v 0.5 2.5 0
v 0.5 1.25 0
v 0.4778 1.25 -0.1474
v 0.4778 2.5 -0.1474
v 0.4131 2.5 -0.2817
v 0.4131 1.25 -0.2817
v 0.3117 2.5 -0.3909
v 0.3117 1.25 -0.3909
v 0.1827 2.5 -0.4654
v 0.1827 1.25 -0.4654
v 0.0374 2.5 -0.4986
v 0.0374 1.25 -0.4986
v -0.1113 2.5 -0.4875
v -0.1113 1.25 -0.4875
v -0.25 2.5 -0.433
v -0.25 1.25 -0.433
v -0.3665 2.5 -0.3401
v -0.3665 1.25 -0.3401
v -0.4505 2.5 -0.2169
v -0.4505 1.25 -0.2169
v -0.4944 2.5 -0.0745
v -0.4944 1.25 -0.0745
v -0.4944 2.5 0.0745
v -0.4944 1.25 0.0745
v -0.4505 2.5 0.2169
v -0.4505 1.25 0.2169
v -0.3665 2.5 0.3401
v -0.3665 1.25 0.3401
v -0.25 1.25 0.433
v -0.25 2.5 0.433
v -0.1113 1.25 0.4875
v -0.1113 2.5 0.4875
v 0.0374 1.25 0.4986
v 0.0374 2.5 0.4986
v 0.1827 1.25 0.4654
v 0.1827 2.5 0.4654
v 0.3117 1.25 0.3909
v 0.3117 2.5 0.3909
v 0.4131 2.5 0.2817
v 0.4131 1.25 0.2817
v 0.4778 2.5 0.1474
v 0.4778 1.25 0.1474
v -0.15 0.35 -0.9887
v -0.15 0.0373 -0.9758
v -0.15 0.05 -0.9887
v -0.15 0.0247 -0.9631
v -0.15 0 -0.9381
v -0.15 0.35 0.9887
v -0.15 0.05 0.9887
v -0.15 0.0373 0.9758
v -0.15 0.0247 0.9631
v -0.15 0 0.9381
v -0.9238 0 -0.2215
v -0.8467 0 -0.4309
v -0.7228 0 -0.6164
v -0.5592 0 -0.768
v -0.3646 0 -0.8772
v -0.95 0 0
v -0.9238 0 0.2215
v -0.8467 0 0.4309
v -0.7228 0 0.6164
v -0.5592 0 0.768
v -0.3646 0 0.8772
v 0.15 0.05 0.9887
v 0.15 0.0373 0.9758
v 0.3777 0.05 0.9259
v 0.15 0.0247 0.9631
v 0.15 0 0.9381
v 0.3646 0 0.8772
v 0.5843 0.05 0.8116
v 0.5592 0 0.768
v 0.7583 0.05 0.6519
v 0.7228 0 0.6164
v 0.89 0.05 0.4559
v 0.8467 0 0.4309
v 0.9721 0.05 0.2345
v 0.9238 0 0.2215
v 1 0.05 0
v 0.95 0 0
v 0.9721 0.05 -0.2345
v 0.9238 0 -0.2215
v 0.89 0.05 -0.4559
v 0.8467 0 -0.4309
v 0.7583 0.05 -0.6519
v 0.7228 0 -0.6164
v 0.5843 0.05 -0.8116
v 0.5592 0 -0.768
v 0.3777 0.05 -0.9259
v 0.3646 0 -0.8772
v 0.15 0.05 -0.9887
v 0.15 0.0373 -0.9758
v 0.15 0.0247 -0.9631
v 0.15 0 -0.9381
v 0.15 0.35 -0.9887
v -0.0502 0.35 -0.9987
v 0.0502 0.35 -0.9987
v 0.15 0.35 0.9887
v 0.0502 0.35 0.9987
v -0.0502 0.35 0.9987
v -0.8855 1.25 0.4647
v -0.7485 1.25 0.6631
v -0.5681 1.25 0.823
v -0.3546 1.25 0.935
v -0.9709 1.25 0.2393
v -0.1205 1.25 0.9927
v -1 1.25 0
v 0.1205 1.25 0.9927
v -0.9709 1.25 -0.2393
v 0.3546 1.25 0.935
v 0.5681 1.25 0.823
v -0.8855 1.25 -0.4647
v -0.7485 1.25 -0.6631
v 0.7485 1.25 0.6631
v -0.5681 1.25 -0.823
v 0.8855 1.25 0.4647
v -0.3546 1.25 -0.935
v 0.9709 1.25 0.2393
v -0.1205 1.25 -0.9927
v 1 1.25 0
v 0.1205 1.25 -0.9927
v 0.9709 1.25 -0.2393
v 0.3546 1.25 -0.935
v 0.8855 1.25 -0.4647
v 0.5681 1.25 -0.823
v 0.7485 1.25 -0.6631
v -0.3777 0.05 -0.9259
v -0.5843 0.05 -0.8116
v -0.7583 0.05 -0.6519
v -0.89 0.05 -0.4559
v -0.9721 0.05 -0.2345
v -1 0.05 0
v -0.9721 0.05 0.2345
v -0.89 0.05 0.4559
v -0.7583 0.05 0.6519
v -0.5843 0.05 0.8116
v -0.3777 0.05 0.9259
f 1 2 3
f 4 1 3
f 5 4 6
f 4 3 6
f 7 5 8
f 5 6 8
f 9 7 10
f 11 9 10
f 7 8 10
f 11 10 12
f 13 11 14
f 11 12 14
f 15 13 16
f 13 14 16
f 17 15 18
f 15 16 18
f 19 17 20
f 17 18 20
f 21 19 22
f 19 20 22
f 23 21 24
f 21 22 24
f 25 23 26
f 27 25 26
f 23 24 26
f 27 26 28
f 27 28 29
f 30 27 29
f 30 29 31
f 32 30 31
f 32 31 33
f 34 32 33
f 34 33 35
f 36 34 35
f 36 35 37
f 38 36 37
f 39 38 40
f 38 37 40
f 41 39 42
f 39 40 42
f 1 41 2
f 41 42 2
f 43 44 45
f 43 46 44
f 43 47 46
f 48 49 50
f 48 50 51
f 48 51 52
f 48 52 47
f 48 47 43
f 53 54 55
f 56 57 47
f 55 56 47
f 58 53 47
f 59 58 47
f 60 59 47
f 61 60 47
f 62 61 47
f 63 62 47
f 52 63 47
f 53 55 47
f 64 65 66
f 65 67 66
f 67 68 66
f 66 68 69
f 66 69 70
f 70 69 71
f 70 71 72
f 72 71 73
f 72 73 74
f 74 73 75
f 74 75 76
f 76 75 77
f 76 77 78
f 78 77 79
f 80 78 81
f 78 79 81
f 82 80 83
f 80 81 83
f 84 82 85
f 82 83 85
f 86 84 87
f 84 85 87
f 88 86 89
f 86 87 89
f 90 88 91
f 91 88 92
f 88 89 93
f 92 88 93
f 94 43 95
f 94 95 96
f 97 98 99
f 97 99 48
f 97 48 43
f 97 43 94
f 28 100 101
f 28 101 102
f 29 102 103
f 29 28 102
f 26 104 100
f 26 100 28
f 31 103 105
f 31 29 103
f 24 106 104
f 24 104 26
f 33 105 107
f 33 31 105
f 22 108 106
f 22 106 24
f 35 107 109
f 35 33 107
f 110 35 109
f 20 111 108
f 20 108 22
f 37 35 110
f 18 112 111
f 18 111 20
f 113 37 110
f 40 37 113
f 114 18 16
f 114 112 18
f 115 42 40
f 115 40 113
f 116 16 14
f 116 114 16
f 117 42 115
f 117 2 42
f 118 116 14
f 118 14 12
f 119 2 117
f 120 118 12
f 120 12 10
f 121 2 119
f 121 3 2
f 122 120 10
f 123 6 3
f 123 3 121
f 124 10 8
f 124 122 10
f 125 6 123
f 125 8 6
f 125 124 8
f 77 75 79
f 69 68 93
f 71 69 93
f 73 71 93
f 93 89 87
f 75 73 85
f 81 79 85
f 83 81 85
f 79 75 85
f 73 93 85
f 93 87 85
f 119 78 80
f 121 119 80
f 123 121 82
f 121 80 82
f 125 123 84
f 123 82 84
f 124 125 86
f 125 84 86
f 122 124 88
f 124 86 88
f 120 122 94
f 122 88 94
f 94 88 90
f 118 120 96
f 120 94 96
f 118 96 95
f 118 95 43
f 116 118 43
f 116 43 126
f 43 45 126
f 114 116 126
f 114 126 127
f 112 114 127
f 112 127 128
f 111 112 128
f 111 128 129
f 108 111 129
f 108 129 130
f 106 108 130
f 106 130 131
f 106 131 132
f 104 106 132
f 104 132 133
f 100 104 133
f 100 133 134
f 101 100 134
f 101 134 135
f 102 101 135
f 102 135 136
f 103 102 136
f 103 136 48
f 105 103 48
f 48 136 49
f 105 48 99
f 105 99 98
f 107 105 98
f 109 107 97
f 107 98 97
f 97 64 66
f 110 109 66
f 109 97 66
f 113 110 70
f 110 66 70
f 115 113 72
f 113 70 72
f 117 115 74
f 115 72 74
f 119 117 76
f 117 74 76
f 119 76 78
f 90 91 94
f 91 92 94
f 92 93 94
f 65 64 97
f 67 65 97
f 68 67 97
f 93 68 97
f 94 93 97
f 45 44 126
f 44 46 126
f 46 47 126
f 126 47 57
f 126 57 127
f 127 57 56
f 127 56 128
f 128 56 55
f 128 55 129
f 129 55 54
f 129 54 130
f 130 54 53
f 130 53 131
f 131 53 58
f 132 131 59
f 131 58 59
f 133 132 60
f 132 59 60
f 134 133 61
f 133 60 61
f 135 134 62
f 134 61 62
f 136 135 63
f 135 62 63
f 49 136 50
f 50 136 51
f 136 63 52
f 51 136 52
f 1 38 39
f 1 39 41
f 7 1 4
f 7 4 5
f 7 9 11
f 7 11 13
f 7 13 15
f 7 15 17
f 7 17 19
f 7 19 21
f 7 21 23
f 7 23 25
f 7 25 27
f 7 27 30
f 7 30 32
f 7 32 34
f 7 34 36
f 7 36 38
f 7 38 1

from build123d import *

# Parameters (mm, degrees)
SKETCH2_R               = 1
BOSS_EXTRUDE1_DEPTH     = 1.25
SKETCH3_R               = 0.5
BOSS_EXTRUDE2_DEPTH     = 1.25
CHAMFER1_SIZE           = 0.05
SKETCH4_W               = 0.3
SKETCH4_H               = 0.35
CUT_EXTRUDE1_DEPTH      = 2
CUT_EXTRUDE1_DEPTH_BACK = 2


with BuildPart() as part:
    # Sketch2 → Boss-Extrude1 (new body)
    with BuildSketch(Plane(origin=(0, 0, 0), x_dir=(1, 0, 0), z_dir=(0, 1, 0))):
        Circle(SKETCH2_R)
    extrude(amount=BOSS_EXTRUDE1_DEPTH)

    # Sketch3 → Boss-Extrude2 (add)
    with BuildSketch(Plane(origin=(0, 1.25, 0), x_dir=(1, 0, 0), z_dir=(0, 1, 0))):
        Circle(SKETCH3_R)
    extrude(amount=BOSS_EXTRUDE2_DEPTH)

    # Chamfer1
    chamfer1_edges = [part.edges().sort_by_distance(p)[0] for p in [
        (-1, 0, 0),
    ]]
    chamfer(chamfer1_edges, length=CHAMFER1_SIZE)

    # Sketch4 → Cut-Extrude1 (cut, two sides)
    with BuildSketch(Plane.XY) as cut_extrude1_sk:
        with Locations((0, 0.175)):
            Rectangle(SKETCH4_W, SKETCH4_H)
    extrude(amount=CUT_EXTRUDE1_DEPTH, mode=Mode.SUBTRACT)
    extrude(cut_extrude1_sk.sketch, amount=-CUT_EXTRUDE1_DEPTH_BACK, mode=Mode.SUBTRACT)


solid = part.part
